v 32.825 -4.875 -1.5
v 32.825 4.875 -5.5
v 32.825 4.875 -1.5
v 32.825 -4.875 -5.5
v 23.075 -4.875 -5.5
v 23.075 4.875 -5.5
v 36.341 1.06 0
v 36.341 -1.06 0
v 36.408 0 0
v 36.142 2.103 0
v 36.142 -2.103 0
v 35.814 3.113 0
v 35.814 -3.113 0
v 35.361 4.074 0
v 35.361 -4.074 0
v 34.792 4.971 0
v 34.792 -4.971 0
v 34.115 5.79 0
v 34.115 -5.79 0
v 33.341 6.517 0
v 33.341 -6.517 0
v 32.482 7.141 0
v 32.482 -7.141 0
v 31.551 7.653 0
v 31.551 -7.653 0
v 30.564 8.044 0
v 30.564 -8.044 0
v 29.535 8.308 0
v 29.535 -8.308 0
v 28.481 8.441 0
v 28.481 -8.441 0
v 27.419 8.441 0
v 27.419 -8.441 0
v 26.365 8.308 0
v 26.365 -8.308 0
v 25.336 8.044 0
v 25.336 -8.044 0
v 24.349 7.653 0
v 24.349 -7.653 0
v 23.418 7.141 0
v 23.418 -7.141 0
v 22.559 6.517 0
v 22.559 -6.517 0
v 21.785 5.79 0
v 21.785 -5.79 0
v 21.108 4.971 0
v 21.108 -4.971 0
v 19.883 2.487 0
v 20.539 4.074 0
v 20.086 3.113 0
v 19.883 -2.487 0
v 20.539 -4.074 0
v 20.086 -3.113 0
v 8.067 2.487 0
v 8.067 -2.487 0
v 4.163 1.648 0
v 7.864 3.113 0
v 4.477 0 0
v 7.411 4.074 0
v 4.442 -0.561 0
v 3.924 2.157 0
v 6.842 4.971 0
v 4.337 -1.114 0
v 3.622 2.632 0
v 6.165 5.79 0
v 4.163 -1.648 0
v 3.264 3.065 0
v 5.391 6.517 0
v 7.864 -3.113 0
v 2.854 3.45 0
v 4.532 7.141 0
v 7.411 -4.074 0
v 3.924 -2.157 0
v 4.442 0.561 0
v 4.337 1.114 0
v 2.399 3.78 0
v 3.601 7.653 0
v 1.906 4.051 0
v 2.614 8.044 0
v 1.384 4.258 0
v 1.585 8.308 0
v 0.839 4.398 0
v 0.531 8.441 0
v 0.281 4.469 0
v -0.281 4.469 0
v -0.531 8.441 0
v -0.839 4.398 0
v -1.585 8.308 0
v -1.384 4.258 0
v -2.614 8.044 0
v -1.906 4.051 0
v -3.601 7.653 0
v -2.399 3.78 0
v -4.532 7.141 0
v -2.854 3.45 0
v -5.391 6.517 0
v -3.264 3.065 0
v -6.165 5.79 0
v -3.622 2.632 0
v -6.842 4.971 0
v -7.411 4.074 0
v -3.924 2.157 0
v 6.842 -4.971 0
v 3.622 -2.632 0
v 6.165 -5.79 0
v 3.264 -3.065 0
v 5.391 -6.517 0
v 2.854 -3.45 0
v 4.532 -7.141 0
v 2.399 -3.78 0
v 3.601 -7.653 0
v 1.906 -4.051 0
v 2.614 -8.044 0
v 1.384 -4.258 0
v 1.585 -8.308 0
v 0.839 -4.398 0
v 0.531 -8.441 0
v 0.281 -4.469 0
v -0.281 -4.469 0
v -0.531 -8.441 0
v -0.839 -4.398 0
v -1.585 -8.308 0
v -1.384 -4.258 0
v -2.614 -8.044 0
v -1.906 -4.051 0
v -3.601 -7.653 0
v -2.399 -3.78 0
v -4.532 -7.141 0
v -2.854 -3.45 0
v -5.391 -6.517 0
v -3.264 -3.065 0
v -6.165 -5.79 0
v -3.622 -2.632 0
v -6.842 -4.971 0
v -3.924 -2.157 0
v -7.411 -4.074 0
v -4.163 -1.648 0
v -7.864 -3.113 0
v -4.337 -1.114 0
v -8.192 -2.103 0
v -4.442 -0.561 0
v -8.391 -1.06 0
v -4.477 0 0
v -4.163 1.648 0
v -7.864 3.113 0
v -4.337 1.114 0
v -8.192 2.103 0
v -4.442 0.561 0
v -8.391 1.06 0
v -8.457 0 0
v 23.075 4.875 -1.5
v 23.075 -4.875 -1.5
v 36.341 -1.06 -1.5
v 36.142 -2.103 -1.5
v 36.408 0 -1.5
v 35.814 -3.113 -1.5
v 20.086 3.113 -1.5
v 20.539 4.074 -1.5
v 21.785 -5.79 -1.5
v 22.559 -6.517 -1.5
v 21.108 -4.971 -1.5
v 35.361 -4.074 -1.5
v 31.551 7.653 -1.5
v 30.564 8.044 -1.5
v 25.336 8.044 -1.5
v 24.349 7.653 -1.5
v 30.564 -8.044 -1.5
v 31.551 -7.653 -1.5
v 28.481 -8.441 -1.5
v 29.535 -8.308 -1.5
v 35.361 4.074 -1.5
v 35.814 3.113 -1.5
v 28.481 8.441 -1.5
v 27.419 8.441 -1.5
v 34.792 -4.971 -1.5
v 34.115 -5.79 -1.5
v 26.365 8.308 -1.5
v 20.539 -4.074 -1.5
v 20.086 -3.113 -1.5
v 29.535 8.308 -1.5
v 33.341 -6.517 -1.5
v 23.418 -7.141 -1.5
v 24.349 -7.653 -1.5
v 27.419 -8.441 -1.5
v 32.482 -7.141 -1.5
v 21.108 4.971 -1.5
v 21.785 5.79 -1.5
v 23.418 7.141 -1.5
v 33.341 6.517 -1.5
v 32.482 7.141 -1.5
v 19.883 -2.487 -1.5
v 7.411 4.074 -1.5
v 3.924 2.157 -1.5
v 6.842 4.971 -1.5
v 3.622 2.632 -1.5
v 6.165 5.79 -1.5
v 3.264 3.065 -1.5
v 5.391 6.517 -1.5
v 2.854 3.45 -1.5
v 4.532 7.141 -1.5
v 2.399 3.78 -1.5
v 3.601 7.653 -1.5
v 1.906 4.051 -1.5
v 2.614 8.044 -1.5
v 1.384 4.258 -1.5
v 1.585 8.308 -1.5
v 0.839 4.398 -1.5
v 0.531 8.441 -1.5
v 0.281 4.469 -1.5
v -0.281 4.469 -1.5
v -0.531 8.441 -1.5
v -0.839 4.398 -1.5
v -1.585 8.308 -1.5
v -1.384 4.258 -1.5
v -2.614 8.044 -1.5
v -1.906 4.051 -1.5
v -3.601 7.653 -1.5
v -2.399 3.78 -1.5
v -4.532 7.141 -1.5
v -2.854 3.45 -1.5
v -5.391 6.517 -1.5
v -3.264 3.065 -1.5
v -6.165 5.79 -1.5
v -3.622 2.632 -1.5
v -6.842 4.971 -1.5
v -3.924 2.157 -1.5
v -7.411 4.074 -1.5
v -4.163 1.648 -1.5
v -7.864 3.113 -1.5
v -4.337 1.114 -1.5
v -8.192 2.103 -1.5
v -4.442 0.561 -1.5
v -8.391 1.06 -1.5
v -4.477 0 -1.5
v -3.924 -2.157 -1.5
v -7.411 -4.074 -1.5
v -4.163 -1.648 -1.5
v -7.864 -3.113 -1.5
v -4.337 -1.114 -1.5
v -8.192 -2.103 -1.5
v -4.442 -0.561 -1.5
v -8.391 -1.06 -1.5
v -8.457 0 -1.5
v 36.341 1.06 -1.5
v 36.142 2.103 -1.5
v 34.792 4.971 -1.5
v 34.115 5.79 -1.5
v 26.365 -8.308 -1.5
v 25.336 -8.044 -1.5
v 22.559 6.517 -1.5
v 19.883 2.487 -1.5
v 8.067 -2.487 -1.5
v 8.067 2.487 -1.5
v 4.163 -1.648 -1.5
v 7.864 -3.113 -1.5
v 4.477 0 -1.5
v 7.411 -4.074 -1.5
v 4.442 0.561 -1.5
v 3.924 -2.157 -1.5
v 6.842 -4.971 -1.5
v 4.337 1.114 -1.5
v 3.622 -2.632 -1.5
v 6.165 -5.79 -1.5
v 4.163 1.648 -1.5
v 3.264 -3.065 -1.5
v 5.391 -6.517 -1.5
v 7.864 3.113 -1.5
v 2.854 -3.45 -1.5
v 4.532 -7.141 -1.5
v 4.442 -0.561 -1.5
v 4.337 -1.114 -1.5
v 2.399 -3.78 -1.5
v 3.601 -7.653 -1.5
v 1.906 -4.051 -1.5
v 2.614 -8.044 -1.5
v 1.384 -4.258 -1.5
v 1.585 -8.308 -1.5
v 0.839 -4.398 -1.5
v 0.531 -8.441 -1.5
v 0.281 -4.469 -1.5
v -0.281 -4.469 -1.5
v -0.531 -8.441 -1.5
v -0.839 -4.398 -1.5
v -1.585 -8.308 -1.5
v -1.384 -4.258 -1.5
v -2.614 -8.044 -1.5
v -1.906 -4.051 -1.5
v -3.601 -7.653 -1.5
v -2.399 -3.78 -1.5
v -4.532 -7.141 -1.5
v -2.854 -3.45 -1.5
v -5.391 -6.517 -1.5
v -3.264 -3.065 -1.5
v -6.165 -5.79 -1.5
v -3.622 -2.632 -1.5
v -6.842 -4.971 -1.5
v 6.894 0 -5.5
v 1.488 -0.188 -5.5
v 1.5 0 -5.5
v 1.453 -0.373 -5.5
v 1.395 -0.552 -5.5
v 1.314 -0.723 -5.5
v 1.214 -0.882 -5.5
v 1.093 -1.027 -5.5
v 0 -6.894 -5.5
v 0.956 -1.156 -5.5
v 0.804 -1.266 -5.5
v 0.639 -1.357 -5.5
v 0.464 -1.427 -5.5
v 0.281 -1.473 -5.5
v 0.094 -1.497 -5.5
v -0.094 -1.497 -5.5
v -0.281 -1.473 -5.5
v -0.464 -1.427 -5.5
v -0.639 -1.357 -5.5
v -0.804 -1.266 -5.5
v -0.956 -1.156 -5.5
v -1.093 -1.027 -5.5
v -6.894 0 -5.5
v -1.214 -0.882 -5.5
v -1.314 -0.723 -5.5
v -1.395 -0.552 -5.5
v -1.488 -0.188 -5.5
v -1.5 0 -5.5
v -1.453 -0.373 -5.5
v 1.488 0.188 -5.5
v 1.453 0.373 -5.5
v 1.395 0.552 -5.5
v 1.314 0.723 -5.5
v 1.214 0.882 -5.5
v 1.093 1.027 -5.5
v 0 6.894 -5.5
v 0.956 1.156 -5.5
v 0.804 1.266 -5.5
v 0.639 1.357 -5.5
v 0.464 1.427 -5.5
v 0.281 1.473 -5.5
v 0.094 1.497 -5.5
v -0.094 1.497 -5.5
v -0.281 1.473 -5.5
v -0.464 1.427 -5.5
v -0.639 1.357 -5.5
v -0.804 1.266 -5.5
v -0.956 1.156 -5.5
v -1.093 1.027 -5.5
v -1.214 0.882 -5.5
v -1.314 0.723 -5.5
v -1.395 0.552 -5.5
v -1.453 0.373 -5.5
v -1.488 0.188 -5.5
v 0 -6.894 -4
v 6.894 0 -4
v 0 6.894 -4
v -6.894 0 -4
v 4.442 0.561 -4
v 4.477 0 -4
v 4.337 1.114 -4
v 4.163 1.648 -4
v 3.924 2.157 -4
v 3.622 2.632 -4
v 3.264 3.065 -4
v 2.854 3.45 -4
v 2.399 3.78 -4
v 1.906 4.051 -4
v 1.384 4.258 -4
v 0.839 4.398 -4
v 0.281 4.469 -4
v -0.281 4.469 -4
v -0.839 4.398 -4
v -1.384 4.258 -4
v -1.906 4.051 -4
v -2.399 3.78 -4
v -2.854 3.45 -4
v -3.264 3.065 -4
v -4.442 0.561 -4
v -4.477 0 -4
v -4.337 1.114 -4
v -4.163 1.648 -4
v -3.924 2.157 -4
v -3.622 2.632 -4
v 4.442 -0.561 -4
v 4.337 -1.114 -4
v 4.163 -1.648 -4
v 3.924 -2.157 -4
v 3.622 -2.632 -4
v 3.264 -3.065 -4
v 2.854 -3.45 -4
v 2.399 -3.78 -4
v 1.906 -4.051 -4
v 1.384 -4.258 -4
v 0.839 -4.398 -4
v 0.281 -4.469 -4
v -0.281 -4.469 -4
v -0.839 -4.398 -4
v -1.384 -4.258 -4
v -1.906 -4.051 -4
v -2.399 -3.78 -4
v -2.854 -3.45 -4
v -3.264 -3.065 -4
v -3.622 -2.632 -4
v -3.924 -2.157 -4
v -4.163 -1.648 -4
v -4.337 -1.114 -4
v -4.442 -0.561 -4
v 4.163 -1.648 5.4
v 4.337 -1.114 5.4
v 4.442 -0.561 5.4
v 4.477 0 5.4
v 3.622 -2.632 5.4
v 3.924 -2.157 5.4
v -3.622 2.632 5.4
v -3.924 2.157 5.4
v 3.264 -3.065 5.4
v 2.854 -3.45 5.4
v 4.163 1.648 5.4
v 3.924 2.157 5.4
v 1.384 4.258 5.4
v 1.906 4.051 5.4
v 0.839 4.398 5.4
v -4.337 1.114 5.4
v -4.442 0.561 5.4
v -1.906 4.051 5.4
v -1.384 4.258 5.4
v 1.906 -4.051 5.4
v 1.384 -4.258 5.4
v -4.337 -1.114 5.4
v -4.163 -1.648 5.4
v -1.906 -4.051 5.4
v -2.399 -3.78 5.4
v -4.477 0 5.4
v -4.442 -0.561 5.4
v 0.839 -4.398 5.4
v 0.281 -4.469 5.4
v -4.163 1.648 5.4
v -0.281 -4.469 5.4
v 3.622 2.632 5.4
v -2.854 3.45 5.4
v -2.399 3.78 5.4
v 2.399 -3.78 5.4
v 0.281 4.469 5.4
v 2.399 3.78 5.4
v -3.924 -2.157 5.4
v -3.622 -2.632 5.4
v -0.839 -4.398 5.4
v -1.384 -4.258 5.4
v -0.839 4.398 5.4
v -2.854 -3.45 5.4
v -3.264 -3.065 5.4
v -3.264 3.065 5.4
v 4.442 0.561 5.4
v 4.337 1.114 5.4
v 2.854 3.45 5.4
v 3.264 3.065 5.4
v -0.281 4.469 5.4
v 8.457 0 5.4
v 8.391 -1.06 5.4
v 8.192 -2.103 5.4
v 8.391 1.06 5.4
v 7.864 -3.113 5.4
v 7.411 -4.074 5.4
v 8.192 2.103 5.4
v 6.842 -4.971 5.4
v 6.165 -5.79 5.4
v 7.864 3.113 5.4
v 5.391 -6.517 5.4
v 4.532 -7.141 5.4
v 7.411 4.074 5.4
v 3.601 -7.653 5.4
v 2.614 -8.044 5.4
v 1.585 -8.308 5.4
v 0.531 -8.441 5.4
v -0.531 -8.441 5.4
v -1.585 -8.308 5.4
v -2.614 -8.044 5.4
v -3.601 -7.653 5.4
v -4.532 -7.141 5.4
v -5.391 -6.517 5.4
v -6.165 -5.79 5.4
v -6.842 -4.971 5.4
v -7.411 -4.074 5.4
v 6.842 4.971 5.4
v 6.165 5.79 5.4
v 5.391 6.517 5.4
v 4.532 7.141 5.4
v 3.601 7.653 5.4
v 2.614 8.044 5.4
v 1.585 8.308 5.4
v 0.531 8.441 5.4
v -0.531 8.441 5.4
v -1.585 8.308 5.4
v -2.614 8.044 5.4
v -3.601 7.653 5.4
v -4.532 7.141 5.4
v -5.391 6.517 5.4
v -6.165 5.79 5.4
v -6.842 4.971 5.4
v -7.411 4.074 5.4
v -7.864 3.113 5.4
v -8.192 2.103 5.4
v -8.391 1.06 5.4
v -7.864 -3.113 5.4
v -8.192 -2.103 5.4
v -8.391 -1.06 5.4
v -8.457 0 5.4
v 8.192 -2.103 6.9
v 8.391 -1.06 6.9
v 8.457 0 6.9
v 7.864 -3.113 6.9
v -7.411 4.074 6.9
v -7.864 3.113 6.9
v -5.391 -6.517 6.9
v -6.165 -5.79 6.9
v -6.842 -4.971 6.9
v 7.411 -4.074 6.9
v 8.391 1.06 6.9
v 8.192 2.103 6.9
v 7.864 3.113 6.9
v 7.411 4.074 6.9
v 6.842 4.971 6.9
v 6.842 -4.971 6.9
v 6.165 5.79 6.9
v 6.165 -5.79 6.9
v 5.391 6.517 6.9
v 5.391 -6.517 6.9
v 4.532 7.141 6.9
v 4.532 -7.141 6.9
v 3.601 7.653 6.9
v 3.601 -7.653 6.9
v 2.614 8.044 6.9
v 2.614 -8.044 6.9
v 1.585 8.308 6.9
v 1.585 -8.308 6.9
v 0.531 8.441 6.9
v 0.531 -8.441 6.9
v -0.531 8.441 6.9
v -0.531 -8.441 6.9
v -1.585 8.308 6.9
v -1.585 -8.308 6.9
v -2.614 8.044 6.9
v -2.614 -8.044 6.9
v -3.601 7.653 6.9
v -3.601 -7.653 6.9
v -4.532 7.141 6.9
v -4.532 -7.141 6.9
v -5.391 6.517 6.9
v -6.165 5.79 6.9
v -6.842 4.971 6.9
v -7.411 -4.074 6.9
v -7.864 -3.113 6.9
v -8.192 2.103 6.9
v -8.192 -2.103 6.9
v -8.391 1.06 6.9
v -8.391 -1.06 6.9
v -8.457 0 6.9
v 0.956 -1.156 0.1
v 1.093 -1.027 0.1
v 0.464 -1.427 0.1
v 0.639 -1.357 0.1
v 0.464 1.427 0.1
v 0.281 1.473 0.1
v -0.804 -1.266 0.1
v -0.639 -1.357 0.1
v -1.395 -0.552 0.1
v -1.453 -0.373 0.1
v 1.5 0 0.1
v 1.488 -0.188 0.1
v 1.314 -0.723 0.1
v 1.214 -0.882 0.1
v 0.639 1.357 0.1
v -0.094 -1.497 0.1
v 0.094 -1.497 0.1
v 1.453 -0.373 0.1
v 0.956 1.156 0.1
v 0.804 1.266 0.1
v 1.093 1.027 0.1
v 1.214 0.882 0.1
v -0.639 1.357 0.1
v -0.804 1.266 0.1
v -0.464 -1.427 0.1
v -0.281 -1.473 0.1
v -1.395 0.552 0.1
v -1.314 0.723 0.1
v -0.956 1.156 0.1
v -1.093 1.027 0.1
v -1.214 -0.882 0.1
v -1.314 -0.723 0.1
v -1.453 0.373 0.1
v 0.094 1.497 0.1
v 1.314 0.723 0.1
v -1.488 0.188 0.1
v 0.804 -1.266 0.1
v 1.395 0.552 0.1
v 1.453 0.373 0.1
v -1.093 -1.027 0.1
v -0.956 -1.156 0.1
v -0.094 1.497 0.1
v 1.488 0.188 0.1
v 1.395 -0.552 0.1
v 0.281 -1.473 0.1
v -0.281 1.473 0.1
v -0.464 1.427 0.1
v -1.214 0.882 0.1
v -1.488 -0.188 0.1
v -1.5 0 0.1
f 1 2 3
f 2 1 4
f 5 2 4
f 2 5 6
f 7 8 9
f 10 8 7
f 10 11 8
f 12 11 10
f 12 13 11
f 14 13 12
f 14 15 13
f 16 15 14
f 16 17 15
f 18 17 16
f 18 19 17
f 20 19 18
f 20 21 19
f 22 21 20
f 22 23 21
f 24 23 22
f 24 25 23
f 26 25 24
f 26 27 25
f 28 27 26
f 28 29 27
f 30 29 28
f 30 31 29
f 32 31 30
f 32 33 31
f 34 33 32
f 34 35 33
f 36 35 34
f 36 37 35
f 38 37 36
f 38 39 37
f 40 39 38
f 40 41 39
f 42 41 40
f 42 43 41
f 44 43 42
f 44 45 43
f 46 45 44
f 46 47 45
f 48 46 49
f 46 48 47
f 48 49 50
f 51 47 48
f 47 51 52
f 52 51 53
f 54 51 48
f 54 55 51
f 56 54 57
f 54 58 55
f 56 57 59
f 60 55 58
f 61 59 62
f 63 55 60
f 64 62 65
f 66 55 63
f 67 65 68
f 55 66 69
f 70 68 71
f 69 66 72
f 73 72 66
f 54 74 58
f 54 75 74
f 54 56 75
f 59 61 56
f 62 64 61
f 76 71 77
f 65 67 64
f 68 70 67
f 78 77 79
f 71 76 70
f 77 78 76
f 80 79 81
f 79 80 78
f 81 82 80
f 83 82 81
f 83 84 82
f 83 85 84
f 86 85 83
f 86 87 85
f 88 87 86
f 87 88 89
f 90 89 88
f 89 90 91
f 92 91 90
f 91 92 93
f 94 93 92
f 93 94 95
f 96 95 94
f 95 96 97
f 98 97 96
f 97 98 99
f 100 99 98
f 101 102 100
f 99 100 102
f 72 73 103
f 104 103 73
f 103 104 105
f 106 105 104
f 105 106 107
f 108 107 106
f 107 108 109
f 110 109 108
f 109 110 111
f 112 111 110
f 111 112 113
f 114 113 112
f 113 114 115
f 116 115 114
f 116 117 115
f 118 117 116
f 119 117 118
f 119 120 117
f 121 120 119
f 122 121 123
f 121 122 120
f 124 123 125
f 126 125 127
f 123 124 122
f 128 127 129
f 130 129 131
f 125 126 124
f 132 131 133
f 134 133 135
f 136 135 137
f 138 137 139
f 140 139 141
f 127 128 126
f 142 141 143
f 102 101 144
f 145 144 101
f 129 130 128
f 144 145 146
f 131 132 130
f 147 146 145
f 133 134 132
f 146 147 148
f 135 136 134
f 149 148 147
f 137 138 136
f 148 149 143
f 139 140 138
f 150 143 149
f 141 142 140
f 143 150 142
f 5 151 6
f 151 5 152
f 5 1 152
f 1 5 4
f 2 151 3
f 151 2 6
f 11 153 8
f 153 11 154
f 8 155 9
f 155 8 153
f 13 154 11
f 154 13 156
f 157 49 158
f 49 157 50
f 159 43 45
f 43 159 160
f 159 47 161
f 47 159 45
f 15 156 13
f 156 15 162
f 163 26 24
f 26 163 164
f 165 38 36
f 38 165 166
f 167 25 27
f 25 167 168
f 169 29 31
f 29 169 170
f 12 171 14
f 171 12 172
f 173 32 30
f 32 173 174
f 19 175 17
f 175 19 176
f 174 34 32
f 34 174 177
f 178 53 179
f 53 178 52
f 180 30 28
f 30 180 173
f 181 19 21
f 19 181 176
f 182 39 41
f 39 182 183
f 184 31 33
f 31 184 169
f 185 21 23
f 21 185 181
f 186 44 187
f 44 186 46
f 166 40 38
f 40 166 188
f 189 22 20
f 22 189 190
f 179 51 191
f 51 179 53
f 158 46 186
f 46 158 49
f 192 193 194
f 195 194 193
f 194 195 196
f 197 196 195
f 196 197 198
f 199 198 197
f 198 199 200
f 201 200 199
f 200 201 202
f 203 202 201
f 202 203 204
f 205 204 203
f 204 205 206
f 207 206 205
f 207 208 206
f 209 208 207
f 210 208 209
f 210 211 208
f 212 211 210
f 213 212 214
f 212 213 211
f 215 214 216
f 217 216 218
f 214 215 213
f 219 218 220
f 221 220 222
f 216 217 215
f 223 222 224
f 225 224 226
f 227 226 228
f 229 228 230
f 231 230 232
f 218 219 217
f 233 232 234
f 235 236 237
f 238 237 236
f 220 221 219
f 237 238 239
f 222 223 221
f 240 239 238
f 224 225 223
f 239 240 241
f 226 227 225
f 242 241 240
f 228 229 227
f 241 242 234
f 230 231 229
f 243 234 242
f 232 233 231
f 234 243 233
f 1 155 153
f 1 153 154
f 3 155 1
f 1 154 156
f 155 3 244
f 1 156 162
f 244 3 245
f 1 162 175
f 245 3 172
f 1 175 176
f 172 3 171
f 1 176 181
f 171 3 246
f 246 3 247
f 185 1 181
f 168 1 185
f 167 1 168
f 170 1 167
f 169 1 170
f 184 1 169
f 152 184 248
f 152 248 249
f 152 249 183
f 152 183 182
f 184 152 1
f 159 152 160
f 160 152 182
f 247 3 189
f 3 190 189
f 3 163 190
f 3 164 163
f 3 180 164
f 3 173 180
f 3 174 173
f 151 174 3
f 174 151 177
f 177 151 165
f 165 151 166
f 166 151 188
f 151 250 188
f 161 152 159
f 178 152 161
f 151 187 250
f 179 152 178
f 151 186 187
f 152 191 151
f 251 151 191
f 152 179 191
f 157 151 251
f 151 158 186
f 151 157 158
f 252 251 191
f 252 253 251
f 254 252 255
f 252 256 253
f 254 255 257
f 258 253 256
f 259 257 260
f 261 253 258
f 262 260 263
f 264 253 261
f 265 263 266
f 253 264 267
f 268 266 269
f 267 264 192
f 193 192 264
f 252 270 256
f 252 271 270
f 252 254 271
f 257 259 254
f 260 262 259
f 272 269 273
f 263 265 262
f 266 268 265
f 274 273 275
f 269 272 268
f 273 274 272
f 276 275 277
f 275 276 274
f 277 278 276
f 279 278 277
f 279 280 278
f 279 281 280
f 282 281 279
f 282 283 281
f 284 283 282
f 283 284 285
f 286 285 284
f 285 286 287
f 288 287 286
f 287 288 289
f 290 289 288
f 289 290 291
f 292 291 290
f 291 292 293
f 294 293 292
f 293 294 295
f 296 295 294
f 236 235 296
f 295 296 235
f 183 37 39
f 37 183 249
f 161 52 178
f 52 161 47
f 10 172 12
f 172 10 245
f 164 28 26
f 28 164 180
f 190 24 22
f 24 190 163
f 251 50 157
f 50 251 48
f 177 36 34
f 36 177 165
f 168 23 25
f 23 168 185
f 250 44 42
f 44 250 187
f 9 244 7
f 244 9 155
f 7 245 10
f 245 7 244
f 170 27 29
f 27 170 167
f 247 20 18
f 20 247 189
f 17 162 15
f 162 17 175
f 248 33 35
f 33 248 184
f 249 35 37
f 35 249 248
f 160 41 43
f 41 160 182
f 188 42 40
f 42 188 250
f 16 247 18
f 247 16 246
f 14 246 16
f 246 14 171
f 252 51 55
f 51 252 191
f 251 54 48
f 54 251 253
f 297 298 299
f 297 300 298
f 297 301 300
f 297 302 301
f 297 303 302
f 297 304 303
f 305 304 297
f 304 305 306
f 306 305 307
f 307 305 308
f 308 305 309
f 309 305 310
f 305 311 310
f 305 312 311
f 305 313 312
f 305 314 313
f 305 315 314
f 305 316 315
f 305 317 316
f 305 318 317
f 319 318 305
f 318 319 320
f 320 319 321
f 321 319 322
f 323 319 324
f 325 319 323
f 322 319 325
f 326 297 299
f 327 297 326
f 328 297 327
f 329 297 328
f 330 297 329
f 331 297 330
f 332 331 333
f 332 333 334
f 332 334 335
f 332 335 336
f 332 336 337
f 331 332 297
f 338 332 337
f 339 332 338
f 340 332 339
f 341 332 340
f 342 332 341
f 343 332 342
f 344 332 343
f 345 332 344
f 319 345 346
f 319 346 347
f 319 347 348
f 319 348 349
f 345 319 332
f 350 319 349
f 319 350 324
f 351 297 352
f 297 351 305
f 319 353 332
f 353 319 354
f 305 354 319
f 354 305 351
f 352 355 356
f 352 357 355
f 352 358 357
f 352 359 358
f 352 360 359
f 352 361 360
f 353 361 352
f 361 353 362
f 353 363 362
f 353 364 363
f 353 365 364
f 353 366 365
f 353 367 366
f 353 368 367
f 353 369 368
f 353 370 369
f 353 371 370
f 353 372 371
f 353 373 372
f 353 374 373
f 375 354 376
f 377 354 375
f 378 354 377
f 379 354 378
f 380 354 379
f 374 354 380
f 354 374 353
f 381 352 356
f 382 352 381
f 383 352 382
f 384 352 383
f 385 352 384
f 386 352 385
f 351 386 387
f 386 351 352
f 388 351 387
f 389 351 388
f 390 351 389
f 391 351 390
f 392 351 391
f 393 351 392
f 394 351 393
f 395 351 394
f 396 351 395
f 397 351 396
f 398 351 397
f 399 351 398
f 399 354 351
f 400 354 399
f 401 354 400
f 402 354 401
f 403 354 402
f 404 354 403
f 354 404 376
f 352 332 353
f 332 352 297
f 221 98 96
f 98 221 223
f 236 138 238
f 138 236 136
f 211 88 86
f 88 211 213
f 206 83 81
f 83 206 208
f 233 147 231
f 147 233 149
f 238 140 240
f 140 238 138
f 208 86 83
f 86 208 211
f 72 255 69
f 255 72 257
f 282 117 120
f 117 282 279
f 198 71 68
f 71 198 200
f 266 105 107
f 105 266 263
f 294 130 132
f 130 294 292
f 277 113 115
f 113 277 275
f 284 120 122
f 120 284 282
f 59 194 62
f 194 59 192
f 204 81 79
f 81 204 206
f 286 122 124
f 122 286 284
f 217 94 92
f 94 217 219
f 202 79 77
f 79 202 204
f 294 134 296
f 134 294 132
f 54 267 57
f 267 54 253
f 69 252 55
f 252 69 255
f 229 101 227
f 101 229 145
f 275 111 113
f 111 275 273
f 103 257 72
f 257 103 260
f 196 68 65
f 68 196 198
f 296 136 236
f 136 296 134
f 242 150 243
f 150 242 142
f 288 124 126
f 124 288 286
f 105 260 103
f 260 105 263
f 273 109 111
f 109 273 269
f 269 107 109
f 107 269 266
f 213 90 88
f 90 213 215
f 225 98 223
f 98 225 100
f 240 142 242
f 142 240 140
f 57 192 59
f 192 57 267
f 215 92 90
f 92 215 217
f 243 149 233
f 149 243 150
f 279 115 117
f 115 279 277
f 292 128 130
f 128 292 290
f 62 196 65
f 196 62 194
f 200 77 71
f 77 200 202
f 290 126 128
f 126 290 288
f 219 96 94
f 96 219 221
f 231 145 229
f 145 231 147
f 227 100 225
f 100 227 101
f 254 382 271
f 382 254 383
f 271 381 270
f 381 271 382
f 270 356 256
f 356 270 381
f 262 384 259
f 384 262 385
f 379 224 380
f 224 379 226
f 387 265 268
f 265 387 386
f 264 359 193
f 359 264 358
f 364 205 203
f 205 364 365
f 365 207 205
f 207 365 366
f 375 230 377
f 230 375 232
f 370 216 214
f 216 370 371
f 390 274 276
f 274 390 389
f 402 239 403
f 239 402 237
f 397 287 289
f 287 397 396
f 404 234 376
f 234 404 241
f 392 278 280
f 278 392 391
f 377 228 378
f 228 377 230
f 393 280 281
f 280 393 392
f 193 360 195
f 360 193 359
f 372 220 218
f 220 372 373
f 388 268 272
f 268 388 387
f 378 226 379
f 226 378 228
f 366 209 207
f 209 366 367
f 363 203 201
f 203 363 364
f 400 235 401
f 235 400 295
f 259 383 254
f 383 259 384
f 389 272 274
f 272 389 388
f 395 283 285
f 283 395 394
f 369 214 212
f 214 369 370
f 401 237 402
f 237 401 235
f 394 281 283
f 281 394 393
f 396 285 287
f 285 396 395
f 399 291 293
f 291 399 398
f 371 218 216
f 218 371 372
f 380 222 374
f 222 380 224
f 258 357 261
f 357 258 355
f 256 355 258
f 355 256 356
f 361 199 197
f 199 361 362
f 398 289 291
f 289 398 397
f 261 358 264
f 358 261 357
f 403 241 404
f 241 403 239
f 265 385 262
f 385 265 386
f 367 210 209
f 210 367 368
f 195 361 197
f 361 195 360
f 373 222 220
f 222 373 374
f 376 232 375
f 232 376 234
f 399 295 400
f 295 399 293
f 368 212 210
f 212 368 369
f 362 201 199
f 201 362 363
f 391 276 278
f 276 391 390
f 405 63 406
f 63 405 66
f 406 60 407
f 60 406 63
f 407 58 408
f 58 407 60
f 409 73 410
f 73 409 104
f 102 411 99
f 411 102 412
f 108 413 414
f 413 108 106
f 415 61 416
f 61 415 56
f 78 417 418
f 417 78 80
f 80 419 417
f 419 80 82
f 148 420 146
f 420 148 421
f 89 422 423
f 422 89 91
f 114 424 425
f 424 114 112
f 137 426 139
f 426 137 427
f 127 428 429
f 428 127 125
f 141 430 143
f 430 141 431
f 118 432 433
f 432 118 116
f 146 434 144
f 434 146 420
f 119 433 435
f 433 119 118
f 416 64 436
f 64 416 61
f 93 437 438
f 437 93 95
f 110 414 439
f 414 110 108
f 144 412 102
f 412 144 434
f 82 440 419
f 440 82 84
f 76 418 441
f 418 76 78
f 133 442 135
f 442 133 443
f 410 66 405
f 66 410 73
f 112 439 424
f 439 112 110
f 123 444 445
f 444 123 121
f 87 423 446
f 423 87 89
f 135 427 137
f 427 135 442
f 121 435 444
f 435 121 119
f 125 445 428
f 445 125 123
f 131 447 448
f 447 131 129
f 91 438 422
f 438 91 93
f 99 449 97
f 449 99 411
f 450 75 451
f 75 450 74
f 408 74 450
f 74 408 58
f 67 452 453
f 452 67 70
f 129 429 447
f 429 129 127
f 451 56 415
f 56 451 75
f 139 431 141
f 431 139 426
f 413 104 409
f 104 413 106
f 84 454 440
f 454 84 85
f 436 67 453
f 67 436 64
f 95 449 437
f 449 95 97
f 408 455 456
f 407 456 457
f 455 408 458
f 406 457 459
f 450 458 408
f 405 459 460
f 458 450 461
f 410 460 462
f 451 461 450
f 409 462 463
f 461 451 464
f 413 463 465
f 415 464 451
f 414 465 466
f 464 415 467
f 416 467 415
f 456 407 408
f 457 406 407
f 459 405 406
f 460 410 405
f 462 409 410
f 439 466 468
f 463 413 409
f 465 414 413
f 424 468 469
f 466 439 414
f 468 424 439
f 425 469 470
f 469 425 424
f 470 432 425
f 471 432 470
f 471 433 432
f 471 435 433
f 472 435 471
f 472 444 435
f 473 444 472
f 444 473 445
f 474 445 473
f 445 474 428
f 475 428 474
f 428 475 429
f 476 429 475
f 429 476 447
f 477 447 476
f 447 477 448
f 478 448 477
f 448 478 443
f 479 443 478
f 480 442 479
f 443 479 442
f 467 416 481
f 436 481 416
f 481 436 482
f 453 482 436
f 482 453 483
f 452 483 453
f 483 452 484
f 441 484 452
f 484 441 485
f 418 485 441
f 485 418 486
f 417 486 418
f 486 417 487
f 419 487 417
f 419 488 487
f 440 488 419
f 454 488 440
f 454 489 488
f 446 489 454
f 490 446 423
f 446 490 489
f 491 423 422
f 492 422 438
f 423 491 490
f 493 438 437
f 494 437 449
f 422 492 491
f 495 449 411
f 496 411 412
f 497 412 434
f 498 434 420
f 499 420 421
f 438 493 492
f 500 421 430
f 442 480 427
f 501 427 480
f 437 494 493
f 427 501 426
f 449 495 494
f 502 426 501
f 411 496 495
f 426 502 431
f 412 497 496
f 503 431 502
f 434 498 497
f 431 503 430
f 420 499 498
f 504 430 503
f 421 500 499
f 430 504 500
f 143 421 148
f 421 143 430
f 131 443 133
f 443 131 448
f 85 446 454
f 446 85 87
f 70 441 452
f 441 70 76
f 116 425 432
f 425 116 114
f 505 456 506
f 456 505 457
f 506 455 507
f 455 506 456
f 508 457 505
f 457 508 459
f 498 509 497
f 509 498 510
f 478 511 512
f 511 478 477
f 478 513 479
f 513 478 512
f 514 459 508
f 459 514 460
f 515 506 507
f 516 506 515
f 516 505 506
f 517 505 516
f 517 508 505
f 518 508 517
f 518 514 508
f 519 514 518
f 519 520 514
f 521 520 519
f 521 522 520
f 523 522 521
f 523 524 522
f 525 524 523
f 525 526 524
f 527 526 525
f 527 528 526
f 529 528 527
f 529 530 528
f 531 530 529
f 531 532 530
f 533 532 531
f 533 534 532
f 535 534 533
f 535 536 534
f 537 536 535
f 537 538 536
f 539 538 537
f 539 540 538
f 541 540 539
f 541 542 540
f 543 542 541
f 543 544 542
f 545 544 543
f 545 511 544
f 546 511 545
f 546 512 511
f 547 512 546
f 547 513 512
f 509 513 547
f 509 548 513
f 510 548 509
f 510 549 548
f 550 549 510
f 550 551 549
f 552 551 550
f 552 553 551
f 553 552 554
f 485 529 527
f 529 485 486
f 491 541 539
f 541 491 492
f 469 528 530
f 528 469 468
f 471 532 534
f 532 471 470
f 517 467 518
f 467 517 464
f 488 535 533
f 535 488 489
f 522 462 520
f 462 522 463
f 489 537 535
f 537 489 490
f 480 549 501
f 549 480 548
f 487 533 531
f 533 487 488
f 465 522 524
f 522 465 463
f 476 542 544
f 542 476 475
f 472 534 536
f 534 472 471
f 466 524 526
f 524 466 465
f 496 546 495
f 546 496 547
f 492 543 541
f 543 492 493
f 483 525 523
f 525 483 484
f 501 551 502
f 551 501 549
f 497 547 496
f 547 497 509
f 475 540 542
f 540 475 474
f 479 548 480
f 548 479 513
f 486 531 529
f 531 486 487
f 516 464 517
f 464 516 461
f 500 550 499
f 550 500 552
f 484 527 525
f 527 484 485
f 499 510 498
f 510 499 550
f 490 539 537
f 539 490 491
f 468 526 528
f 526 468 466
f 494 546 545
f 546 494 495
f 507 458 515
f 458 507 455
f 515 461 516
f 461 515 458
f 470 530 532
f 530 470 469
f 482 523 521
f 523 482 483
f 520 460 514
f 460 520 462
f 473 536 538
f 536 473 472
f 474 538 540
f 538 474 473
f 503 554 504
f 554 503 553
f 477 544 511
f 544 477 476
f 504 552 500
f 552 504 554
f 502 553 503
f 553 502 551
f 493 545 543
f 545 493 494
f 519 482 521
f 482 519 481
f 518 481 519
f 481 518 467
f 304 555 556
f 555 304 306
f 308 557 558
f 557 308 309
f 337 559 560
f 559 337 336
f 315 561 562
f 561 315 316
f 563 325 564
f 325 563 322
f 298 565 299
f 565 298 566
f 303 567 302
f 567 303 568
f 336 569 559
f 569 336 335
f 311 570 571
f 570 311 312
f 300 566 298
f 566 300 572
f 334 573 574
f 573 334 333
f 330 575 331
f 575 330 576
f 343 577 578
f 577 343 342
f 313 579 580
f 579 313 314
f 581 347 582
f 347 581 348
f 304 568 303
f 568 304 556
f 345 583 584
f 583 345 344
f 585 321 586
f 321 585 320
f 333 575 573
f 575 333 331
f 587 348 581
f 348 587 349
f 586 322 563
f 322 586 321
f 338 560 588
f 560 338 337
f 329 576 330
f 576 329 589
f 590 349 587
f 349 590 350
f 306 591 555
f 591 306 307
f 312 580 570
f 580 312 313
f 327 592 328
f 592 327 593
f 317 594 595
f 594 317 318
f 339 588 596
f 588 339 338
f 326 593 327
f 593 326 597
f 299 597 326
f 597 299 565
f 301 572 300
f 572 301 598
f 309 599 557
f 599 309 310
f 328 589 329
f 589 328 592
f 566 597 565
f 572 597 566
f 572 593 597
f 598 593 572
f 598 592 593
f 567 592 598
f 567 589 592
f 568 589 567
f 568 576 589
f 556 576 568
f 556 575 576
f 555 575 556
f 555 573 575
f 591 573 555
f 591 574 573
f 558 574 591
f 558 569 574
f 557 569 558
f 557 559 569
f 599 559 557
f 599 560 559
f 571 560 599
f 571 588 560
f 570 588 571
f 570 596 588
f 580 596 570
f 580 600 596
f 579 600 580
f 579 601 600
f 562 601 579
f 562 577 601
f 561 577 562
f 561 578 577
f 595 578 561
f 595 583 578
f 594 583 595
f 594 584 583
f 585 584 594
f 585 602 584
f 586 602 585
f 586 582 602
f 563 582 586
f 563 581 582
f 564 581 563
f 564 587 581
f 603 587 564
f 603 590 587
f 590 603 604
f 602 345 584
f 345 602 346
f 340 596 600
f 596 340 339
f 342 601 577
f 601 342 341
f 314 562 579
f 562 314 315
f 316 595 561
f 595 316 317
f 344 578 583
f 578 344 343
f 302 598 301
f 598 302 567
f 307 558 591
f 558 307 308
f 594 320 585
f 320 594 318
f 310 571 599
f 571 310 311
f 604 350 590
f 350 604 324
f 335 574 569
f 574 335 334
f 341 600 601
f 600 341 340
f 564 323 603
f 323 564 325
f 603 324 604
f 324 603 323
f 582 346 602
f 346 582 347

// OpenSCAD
$fn=50;
ts=1.5;

kv=9.95;//размер ячейкм
dd=18;//растояние между ячейками
tst=2.5;//толщина стенки = сетки
dot=3;//for sanorez
hn=4;//h nogi
dno=kv*1.7;//d fix

dk=kv*1.7;
dv=kv*0.9;

rotate([180,0,0])difference(){
    union(){
        translate([(dd+kv)/2,0,ts/2])cube([ dd+kv,kv/2, ts],true);
        translate([0,0,ts/2+ts+tst])rotate([0,0,45])cube([ kv-0.2,kv-0.2, ts],true);
        cylinder(ts, dk/2, dk/2);
        translate([0,0,0])cylinder(ts+tst, dv/2, dv/2);
        translate([0,0,-(ts+hn)+0.1])cylinder((ts+hn), dv/2, dv/2);
        translate([0,0,-(ts+hn)+0.1-ts])cylinder(ts, dno/2, dno/2);
        translate([dd+kv,0,0]){
            translate([0,0,(2*ts+tst)/2])rotate([0,0,0])cube([ kv-0.2,kv-0.2, 2*ts+tst],true);
            cylinder(ts, dk/2, dk/2);
        }
    }
    translate([0,0,-0.1])cylinder((ts+tst)*2, dot/2, dot/2);
}
